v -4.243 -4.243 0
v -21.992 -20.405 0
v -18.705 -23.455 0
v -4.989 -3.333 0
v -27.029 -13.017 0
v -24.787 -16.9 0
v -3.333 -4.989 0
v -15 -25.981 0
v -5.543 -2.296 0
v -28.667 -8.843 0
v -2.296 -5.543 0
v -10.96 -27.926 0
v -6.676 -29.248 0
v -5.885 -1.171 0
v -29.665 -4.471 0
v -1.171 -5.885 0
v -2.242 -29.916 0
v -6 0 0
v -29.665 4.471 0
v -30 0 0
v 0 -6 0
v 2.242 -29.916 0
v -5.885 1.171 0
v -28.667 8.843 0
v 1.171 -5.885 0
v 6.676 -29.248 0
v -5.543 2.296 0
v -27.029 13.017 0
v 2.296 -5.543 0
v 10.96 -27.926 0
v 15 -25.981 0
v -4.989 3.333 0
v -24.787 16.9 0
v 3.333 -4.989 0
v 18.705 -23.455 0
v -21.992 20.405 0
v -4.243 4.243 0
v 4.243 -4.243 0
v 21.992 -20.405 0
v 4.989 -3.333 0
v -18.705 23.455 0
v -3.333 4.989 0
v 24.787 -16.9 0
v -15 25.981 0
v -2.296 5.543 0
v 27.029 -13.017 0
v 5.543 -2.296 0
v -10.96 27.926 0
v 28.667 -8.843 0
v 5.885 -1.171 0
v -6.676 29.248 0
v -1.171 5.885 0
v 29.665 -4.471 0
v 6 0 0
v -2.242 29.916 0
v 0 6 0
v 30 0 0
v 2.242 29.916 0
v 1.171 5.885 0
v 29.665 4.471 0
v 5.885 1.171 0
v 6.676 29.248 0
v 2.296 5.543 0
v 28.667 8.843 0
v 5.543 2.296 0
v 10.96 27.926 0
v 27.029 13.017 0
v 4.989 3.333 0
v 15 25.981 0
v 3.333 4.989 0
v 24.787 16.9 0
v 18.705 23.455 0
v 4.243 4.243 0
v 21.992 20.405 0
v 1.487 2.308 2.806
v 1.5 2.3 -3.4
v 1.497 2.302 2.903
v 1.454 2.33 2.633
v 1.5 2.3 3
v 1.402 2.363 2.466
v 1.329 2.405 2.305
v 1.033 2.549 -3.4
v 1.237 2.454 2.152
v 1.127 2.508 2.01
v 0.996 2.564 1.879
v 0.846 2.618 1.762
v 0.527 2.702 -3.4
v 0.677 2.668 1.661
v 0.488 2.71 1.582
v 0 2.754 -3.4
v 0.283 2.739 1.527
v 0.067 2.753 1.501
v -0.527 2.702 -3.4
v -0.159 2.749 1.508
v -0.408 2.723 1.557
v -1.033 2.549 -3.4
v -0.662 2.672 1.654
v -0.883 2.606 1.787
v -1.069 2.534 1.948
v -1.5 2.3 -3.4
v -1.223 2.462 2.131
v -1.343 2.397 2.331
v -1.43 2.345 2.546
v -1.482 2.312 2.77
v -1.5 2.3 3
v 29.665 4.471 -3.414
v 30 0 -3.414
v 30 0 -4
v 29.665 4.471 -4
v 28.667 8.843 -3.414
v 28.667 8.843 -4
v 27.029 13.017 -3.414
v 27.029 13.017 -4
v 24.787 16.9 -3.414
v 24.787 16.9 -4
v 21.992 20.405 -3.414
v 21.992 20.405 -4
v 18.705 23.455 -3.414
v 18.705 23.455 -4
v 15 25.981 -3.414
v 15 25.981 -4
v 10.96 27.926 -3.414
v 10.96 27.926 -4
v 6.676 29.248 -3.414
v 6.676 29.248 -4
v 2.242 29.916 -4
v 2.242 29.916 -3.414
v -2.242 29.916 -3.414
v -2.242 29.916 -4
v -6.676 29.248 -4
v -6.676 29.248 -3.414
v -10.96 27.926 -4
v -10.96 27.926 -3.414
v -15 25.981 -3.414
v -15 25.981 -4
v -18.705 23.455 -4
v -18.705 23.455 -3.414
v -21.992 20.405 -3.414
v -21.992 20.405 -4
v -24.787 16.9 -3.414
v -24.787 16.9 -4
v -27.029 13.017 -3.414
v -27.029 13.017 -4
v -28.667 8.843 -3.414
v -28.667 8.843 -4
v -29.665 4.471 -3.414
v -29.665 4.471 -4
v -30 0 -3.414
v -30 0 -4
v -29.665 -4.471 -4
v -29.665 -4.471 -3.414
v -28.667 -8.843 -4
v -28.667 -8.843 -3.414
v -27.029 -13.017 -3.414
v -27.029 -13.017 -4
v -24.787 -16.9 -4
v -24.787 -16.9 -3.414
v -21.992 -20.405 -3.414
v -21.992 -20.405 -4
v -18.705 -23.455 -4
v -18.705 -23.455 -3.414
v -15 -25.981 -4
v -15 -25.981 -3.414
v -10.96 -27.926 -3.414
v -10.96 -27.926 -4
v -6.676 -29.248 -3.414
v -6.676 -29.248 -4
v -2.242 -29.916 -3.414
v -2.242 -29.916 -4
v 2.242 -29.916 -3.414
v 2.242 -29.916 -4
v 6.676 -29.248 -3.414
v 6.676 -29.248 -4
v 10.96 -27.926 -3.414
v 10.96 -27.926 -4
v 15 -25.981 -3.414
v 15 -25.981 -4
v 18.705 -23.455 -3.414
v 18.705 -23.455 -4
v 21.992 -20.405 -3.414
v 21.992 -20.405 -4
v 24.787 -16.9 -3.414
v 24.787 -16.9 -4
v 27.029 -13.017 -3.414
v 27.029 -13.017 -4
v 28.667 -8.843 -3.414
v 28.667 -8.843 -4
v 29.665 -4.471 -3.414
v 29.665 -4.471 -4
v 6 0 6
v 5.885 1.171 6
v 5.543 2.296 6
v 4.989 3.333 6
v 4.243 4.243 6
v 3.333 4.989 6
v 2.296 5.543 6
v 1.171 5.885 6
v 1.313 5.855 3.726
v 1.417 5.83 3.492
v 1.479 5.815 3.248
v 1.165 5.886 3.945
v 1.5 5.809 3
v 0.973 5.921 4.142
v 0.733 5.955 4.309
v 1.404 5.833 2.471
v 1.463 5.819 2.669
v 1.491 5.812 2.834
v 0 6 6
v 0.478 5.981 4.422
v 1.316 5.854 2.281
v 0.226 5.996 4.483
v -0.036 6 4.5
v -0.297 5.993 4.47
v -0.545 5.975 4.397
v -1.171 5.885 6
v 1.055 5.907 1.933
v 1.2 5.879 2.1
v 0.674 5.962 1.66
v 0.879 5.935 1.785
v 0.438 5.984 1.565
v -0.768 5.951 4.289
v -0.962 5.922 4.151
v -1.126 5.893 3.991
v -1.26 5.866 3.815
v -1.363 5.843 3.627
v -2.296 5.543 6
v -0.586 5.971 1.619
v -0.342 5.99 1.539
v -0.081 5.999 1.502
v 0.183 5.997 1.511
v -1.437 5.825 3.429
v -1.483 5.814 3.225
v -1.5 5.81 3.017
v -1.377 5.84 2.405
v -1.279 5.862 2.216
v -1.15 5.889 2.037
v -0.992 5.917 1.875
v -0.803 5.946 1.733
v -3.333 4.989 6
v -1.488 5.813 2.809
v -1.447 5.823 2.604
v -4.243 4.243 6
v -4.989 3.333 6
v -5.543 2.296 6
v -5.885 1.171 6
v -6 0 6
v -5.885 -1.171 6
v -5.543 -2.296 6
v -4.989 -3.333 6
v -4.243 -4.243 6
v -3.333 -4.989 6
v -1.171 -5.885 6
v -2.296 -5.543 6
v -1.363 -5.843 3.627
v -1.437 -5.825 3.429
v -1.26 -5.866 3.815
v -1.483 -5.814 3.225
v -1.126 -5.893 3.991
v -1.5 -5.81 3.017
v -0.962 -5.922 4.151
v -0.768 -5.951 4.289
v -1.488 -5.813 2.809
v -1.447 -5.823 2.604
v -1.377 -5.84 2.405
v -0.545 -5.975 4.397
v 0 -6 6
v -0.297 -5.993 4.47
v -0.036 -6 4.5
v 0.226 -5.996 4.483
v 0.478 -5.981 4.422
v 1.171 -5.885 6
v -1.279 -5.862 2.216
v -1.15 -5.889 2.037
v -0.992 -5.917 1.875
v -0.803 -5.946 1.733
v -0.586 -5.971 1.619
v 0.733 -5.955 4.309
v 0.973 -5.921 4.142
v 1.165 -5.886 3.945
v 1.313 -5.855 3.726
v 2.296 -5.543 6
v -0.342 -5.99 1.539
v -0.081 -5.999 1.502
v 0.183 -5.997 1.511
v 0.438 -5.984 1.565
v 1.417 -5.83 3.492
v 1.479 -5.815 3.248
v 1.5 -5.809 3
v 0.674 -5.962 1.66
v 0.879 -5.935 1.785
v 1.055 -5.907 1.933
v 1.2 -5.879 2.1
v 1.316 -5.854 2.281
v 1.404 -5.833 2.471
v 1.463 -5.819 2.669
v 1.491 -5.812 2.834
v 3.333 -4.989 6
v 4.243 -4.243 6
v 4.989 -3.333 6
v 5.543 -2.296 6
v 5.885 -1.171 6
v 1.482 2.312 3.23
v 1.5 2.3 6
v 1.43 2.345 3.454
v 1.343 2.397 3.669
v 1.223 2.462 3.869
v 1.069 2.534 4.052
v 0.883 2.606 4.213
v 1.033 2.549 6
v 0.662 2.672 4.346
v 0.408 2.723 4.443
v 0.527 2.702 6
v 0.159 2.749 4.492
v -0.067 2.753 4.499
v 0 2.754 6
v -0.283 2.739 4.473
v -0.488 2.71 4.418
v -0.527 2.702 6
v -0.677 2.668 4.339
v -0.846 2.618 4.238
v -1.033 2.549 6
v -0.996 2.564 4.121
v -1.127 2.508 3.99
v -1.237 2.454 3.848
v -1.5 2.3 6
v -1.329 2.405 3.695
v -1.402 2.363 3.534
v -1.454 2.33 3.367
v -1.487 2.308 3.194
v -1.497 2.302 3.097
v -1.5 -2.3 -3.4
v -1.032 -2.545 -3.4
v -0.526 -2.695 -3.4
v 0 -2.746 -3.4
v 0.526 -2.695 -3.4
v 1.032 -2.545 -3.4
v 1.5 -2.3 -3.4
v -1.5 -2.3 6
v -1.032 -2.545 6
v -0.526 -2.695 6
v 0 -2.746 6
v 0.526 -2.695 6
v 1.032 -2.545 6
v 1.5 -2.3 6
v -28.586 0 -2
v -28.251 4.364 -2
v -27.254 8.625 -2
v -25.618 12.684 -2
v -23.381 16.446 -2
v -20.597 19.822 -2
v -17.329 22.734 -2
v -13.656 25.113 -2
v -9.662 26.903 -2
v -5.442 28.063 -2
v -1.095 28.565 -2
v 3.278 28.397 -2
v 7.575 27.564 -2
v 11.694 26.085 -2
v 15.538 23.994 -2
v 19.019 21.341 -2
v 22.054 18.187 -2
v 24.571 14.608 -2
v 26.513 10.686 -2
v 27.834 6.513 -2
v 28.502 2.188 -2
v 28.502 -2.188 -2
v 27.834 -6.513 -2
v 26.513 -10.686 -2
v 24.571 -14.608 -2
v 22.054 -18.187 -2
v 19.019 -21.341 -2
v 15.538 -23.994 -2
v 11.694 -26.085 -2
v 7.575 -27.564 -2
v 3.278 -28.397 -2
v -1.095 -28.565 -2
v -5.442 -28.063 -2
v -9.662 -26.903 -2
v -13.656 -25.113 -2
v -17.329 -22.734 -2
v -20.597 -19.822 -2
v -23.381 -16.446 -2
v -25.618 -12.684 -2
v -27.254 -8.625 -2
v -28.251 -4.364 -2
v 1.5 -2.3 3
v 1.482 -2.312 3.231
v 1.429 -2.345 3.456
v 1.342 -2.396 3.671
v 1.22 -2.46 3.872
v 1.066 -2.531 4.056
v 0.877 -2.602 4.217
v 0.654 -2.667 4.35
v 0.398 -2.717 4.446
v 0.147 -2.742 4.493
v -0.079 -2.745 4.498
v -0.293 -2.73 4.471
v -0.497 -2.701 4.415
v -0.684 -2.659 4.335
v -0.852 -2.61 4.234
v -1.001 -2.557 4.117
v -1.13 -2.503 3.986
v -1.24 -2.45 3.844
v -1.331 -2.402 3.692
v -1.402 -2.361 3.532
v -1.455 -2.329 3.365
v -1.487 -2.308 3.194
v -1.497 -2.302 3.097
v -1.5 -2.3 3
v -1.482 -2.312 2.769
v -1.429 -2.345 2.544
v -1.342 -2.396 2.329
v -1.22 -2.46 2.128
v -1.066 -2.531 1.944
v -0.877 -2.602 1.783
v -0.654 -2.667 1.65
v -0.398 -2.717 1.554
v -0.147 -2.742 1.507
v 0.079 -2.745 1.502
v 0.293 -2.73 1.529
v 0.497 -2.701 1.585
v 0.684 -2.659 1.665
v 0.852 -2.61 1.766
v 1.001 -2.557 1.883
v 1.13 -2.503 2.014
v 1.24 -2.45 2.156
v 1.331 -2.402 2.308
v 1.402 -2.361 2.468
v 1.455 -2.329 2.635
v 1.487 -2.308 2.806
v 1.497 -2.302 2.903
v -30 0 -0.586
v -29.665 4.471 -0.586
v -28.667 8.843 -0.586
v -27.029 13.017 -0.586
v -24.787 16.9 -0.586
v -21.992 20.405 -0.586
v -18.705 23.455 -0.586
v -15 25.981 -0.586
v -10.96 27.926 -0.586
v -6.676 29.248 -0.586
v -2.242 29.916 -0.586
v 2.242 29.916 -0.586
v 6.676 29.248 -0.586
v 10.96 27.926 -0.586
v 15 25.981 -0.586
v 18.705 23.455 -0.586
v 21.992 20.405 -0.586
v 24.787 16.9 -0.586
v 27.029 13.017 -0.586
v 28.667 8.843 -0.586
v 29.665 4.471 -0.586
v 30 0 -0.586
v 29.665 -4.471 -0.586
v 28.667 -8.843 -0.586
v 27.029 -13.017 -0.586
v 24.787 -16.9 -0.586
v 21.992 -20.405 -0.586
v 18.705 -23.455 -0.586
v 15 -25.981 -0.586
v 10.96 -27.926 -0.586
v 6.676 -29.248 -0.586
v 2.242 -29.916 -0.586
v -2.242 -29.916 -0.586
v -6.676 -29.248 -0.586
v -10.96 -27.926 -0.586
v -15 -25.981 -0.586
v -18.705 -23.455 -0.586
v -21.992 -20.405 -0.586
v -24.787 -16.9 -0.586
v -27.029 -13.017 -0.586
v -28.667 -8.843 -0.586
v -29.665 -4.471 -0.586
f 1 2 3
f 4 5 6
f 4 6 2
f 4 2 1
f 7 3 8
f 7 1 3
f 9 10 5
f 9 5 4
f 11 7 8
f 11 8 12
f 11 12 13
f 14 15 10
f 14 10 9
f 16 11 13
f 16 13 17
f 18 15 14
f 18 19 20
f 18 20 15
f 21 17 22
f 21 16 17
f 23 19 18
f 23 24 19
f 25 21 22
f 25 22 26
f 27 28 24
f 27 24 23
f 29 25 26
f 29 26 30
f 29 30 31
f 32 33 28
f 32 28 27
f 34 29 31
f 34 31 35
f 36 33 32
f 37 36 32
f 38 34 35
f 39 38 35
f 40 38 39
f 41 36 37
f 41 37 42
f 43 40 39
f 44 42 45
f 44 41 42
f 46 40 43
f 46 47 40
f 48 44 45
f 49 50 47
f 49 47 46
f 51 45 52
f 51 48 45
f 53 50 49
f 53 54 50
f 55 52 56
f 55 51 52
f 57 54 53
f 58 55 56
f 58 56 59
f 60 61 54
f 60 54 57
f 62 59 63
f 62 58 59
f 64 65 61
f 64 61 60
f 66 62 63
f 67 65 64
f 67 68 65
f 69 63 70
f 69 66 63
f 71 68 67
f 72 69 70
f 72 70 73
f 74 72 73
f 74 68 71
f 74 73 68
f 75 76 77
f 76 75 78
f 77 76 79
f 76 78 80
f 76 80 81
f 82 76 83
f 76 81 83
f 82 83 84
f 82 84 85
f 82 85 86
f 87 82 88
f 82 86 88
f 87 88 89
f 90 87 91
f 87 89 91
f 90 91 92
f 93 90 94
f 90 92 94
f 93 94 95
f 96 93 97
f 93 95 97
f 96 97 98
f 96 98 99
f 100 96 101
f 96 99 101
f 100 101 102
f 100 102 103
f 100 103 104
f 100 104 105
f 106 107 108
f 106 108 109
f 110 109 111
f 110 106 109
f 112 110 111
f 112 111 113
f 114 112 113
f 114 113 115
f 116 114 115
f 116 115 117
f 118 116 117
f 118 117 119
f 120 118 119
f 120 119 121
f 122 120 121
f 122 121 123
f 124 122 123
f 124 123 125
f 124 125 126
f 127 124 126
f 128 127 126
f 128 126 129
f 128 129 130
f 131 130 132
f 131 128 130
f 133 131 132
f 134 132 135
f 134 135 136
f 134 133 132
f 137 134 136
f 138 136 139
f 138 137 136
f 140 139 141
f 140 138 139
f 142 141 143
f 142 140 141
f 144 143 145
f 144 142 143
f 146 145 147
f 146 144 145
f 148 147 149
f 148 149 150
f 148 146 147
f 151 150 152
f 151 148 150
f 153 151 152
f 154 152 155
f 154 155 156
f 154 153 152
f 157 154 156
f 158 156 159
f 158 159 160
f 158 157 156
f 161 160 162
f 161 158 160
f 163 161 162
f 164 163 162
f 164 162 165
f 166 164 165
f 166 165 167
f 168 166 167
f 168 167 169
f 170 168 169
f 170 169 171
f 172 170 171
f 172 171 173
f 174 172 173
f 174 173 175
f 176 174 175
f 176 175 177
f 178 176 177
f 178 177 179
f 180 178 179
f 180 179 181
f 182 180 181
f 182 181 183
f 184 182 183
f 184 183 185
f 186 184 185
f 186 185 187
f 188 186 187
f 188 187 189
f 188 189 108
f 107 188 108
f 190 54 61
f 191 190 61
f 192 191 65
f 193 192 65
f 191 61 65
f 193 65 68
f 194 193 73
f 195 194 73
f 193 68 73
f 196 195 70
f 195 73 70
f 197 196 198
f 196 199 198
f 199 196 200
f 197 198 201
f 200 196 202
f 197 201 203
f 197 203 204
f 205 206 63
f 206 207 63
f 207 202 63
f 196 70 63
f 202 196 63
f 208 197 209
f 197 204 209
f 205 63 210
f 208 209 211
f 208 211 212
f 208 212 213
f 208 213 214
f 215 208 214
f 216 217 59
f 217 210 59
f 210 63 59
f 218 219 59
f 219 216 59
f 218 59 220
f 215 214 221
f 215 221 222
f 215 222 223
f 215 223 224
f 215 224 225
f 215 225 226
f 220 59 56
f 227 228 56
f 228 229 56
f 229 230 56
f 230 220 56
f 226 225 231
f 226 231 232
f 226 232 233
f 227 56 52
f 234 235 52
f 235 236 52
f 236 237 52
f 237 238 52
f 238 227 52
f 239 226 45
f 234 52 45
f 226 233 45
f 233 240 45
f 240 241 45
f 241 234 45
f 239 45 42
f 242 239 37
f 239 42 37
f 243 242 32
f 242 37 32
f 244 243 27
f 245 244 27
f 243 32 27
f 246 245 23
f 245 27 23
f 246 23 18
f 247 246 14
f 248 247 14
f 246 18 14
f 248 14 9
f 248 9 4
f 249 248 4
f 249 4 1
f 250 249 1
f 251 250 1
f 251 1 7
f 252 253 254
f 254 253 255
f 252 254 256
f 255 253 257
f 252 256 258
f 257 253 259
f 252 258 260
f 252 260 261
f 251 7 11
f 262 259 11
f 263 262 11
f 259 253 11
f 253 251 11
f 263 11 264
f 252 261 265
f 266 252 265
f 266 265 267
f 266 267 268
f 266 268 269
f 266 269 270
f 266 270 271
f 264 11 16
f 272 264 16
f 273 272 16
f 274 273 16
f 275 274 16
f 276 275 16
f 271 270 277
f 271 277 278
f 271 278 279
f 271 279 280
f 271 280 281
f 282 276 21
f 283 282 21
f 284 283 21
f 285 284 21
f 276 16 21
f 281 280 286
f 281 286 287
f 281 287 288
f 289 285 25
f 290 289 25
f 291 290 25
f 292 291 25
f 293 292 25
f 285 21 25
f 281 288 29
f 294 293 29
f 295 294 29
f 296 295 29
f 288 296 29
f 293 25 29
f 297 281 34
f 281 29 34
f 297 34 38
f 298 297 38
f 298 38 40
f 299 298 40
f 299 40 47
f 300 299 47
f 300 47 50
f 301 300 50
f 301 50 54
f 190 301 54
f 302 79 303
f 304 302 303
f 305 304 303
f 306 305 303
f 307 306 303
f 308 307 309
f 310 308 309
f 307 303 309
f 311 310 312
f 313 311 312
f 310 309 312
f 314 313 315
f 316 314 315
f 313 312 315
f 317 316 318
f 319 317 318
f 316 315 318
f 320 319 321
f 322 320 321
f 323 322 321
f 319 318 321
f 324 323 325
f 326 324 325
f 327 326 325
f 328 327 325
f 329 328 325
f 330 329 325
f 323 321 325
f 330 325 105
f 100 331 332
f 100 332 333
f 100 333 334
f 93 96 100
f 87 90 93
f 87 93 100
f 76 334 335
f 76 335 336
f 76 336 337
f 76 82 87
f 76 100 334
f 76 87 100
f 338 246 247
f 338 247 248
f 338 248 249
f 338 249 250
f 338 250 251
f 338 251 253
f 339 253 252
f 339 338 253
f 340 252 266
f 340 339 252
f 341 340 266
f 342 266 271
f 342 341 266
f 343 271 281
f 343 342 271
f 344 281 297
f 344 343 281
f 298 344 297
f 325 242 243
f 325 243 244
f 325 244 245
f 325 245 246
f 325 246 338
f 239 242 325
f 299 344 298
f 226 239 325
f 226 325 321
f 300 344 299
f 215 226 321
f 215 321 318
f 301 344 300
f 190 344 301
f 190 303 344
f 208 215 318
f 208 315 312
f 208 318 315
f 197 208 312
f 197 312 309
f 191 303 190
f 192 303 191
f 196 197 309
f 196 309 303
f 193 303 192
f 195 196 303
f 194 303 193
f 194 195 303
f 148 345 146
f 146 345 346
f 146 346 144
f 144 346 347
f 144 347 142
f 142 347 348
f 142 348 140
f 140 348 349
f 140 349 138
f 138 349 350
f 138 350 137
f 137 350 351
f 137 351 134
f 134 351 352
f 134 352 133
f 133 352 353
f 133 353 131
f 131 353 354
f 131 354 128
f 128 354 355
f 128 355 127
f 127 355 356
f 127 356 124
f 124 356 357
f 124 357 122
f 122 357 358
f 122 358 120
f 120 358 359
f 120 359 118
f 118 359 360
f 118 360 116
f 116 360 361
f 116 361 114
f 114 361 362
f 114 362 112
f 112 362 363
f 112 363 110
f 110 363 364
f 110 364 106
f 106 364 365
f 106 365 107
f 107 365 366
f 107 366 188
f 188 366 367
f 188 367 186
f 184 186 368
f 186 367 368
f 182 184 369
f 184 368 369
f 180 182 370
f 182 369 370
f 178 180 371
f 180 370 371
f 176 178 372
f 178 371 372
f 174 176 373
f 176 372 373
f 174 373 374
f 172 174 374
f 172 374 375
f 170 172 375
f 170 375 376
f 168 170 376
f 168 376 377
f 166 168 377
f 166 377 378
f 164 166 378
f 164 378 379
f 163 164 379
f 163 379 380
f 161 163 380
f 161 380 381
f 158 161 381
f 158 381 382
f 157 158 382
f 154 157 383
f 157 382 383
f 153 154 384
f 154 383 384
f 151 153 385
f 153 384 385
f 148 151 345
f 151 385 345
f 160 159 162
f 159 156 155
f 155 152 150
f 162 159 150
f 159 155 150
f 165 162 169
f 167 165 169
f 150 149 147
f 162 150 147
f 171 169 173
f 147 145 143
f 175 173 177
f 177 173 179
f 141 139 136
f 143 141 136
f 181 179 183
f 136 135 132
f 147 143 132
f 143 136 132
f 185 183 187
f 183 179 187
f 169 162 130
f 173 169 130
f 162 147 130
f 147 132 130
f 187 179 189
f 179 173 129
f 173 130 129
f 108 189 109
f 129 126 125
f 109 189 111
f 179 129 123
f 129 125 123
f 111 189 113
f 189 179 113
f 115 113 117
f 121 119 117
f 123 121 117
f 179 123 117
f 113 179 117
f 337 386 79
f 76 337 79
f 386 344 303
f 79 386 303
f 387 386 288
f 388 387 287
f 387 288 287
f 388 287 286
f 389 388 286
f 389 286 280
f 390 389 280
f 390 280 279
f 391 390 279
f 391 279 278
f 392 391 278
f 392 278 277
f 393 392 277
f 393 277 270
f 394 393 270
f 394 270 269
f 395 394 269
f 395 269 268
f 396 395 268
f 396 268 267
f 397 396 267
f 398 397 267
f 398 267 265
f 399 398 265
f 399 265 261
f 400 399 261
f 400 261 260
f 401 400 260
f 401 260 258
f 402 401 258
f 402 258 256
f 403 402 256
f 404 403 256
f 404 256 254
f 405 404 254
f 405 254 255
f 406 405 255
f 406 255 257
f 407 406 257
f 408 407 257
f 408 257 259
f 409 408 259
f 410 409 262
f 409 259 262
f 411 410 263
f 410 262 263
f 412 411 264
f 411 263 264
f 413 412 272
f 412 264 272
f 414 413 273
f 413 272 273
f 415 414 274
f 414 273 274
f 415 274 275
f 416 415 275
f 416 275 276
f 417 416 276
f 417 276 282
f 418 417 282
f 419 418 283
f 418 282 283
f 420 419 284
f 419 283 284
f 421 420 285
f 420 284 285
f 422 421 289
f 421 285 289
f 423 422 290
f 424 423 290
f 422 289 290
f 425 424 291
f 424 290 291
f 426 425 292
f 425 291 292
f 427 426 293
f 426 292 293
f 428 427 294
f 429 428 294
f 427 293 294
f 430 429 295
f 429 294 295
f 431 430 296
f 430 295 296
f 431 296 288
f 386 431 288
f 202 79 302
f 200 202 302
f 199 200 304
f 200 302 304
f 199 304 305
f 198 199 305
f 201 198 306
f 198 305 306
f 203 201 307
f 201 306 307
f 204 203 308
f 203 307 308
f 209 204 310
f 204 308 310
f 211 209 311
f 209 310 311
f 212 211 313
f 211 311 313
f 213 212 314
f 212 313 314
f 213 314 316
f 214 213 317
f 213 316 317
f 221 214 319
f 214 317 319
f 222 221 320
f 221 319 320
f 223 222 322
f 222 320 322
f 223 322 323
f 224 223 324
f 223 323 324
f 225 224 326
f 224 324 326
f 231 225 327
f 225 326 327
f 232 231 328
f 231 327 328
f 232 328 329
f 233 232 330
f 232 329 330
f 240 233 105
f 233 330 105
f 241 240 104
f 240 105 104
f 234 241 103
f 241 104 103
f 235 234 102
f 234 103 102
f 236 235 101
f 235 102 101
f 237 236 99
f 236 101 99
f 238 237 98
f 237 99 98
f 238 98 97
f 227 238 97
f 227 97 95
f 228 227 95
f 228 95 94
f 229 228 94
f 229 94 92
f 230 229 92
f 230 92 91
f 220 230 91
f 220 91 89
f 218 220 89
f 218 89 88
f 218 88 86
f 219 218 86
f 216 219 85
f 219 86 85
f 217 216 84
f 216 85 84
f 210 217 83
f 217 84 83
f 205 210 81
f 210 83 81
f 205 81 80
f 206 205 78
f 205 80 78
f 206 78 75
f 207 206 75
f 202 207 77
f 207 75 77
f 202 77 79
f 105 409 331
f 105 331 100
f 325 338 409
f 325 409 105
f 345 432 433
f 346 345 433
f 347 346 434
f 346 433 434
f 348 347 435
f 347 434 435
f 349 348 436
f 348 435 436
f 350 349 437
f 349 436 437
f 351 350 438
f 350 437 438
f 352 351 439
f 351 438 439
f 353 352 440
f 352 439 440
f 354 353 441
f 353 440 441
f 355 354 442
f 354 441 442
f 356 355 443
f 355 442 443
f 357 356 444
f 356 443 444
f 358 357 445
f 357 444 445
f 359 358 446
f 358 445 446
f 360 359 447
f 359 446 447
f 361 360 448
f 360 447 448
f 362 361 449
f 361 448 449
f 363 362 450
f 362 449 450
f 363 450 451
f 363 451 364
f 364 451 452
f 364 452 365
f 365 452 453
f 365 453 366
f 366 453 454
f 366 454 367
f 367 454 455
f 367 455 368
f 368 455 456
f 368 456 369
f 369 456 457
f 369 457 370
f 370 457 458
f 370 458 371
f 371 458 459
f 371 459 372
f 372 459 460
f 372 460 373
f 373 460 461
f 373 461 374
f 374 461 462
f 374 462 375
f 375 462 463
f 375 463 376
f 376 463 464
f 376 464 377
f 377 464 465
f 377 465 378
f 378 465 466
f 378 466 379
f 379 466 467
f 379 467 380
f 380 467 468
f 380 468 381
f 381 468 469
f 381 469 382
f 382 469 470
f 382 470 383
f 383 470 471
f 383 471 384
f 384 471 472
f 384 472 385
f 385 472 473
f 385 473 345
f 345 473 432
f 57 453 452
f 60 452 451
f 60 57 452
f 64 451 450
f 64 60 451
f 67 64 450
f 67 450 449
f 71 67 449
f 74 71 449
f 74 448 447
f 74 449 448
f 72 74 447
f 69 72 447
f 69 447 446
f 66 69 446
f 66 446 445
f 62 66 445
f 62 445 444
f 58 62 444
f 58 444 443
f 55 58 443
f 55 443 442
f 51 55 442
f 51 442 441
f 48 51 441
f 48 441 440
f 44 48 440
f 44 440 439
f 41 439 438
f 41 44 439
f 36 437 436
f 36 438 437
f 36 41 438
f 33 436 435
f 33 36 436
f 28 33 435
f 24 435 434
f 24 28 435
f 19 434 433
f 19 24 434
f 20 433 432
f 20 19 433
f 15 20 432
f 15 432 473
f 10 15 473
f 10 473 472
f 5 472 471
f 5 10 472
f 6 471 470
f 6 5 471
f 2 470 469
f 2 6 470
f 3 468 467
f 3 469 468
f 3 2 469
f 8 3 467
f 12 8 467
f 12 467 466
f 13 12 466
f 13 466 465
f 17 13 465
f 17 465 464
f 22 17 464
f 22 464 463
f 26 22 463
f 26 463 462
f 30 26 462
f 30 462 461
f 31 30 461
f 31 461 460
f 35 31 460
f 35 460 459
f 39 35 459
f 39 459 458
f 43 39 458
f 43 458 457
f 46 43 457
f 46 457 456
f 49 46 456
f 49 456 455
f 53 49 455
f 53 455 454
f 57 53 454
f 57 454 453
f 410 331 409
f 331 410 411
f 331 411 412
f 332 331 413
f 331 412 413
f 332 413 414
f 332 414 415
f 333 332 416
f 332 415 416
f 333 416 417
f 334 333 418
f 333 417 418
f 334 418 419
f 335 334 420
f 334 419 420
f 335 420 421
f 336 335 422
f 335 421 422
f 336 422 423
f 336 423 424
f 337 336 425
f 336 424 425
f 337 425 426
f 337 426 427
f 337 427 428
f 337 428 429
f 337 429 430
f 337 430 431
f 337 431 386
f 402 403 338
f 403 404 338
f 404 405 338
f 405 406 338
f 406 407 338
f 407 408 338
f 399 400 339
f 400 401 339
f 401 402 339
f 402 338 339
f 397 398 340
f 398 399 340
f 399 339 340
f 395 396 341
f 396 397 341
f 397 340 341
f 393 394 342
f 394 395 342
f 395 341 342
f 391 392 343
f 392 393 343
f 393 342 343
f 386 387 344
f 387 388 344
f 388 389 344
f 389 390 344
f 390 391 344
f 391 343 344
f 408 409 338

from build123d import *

# Parameters (mm, degrees)
F0_R     = 30
F0_R_2   = 6
F1_DEPTH = 4
F2_DEPTH = 6
F3_R     = 1.5
F4_DEPTH = 12.5
F5_W     = 3
F5_H     = 4.6
F6_DEPTH = 9.4


with BuildPart() as f1:
    # F0 (on Top) → F1 (new body)
    with BuildSketch(Plane.XY):
        Circle(F0_R)
        Circle(F0_R_2, mode=Mode.SUBTRACT)
        Circle(F0_R_2)
    extrude(amount=-F1_DEPTH)

    # F0 (on Top) → F2 (join)
    with BuildSketch(Plane.XY):
        Circle(F0_R_2)
    extrude(amount=F2_DEPTH)

    # F3 (on Front) → F4 (cut, symmetric)
    with BuildSketch(Plane.XZ):
        with Locations((0, 3)):
            Circle(F3_R)
    extrude(amount=F4_DEPTH, both=True, mode=Mode.SUBTRACT)

    # F5 (on face) → F6 (cut)
    with BuildSketch(Plane.XY.offset(6)):
        Rectangle(F5_W, F5_H)
        with BuildLine():
            Line((-1.5, 2.3), (1.5, 2.3))
            ThreePointArc((1.5, 2.3), (0, 2.7540939565), (-1.5, 2.3))
        make_face()
        with BuildLine():
            ThreePointArc((-1.5, -2.3), (0, -2.7459060435), (1.5, -2.3))
            Line((1.5, -2.3), (-1.5, -2.3))
        make_face()
    extrude(amount=-F6_DEPTH, mode=Mode.SUBTRACT)

    # F7 (on Front) → F8 (revolve, cut)
    with BuildSketch(Plane.XZ):
        Polygon((-28.5857864376, -2), (-30, -0.5857864376), (-30, -3.4142135624), align=None)
    revolve(axis=Axis((0, 0, 0.2672639675), (0, 0, -1)), mode=Mode.SUBTRACT)


solid = f1.part
